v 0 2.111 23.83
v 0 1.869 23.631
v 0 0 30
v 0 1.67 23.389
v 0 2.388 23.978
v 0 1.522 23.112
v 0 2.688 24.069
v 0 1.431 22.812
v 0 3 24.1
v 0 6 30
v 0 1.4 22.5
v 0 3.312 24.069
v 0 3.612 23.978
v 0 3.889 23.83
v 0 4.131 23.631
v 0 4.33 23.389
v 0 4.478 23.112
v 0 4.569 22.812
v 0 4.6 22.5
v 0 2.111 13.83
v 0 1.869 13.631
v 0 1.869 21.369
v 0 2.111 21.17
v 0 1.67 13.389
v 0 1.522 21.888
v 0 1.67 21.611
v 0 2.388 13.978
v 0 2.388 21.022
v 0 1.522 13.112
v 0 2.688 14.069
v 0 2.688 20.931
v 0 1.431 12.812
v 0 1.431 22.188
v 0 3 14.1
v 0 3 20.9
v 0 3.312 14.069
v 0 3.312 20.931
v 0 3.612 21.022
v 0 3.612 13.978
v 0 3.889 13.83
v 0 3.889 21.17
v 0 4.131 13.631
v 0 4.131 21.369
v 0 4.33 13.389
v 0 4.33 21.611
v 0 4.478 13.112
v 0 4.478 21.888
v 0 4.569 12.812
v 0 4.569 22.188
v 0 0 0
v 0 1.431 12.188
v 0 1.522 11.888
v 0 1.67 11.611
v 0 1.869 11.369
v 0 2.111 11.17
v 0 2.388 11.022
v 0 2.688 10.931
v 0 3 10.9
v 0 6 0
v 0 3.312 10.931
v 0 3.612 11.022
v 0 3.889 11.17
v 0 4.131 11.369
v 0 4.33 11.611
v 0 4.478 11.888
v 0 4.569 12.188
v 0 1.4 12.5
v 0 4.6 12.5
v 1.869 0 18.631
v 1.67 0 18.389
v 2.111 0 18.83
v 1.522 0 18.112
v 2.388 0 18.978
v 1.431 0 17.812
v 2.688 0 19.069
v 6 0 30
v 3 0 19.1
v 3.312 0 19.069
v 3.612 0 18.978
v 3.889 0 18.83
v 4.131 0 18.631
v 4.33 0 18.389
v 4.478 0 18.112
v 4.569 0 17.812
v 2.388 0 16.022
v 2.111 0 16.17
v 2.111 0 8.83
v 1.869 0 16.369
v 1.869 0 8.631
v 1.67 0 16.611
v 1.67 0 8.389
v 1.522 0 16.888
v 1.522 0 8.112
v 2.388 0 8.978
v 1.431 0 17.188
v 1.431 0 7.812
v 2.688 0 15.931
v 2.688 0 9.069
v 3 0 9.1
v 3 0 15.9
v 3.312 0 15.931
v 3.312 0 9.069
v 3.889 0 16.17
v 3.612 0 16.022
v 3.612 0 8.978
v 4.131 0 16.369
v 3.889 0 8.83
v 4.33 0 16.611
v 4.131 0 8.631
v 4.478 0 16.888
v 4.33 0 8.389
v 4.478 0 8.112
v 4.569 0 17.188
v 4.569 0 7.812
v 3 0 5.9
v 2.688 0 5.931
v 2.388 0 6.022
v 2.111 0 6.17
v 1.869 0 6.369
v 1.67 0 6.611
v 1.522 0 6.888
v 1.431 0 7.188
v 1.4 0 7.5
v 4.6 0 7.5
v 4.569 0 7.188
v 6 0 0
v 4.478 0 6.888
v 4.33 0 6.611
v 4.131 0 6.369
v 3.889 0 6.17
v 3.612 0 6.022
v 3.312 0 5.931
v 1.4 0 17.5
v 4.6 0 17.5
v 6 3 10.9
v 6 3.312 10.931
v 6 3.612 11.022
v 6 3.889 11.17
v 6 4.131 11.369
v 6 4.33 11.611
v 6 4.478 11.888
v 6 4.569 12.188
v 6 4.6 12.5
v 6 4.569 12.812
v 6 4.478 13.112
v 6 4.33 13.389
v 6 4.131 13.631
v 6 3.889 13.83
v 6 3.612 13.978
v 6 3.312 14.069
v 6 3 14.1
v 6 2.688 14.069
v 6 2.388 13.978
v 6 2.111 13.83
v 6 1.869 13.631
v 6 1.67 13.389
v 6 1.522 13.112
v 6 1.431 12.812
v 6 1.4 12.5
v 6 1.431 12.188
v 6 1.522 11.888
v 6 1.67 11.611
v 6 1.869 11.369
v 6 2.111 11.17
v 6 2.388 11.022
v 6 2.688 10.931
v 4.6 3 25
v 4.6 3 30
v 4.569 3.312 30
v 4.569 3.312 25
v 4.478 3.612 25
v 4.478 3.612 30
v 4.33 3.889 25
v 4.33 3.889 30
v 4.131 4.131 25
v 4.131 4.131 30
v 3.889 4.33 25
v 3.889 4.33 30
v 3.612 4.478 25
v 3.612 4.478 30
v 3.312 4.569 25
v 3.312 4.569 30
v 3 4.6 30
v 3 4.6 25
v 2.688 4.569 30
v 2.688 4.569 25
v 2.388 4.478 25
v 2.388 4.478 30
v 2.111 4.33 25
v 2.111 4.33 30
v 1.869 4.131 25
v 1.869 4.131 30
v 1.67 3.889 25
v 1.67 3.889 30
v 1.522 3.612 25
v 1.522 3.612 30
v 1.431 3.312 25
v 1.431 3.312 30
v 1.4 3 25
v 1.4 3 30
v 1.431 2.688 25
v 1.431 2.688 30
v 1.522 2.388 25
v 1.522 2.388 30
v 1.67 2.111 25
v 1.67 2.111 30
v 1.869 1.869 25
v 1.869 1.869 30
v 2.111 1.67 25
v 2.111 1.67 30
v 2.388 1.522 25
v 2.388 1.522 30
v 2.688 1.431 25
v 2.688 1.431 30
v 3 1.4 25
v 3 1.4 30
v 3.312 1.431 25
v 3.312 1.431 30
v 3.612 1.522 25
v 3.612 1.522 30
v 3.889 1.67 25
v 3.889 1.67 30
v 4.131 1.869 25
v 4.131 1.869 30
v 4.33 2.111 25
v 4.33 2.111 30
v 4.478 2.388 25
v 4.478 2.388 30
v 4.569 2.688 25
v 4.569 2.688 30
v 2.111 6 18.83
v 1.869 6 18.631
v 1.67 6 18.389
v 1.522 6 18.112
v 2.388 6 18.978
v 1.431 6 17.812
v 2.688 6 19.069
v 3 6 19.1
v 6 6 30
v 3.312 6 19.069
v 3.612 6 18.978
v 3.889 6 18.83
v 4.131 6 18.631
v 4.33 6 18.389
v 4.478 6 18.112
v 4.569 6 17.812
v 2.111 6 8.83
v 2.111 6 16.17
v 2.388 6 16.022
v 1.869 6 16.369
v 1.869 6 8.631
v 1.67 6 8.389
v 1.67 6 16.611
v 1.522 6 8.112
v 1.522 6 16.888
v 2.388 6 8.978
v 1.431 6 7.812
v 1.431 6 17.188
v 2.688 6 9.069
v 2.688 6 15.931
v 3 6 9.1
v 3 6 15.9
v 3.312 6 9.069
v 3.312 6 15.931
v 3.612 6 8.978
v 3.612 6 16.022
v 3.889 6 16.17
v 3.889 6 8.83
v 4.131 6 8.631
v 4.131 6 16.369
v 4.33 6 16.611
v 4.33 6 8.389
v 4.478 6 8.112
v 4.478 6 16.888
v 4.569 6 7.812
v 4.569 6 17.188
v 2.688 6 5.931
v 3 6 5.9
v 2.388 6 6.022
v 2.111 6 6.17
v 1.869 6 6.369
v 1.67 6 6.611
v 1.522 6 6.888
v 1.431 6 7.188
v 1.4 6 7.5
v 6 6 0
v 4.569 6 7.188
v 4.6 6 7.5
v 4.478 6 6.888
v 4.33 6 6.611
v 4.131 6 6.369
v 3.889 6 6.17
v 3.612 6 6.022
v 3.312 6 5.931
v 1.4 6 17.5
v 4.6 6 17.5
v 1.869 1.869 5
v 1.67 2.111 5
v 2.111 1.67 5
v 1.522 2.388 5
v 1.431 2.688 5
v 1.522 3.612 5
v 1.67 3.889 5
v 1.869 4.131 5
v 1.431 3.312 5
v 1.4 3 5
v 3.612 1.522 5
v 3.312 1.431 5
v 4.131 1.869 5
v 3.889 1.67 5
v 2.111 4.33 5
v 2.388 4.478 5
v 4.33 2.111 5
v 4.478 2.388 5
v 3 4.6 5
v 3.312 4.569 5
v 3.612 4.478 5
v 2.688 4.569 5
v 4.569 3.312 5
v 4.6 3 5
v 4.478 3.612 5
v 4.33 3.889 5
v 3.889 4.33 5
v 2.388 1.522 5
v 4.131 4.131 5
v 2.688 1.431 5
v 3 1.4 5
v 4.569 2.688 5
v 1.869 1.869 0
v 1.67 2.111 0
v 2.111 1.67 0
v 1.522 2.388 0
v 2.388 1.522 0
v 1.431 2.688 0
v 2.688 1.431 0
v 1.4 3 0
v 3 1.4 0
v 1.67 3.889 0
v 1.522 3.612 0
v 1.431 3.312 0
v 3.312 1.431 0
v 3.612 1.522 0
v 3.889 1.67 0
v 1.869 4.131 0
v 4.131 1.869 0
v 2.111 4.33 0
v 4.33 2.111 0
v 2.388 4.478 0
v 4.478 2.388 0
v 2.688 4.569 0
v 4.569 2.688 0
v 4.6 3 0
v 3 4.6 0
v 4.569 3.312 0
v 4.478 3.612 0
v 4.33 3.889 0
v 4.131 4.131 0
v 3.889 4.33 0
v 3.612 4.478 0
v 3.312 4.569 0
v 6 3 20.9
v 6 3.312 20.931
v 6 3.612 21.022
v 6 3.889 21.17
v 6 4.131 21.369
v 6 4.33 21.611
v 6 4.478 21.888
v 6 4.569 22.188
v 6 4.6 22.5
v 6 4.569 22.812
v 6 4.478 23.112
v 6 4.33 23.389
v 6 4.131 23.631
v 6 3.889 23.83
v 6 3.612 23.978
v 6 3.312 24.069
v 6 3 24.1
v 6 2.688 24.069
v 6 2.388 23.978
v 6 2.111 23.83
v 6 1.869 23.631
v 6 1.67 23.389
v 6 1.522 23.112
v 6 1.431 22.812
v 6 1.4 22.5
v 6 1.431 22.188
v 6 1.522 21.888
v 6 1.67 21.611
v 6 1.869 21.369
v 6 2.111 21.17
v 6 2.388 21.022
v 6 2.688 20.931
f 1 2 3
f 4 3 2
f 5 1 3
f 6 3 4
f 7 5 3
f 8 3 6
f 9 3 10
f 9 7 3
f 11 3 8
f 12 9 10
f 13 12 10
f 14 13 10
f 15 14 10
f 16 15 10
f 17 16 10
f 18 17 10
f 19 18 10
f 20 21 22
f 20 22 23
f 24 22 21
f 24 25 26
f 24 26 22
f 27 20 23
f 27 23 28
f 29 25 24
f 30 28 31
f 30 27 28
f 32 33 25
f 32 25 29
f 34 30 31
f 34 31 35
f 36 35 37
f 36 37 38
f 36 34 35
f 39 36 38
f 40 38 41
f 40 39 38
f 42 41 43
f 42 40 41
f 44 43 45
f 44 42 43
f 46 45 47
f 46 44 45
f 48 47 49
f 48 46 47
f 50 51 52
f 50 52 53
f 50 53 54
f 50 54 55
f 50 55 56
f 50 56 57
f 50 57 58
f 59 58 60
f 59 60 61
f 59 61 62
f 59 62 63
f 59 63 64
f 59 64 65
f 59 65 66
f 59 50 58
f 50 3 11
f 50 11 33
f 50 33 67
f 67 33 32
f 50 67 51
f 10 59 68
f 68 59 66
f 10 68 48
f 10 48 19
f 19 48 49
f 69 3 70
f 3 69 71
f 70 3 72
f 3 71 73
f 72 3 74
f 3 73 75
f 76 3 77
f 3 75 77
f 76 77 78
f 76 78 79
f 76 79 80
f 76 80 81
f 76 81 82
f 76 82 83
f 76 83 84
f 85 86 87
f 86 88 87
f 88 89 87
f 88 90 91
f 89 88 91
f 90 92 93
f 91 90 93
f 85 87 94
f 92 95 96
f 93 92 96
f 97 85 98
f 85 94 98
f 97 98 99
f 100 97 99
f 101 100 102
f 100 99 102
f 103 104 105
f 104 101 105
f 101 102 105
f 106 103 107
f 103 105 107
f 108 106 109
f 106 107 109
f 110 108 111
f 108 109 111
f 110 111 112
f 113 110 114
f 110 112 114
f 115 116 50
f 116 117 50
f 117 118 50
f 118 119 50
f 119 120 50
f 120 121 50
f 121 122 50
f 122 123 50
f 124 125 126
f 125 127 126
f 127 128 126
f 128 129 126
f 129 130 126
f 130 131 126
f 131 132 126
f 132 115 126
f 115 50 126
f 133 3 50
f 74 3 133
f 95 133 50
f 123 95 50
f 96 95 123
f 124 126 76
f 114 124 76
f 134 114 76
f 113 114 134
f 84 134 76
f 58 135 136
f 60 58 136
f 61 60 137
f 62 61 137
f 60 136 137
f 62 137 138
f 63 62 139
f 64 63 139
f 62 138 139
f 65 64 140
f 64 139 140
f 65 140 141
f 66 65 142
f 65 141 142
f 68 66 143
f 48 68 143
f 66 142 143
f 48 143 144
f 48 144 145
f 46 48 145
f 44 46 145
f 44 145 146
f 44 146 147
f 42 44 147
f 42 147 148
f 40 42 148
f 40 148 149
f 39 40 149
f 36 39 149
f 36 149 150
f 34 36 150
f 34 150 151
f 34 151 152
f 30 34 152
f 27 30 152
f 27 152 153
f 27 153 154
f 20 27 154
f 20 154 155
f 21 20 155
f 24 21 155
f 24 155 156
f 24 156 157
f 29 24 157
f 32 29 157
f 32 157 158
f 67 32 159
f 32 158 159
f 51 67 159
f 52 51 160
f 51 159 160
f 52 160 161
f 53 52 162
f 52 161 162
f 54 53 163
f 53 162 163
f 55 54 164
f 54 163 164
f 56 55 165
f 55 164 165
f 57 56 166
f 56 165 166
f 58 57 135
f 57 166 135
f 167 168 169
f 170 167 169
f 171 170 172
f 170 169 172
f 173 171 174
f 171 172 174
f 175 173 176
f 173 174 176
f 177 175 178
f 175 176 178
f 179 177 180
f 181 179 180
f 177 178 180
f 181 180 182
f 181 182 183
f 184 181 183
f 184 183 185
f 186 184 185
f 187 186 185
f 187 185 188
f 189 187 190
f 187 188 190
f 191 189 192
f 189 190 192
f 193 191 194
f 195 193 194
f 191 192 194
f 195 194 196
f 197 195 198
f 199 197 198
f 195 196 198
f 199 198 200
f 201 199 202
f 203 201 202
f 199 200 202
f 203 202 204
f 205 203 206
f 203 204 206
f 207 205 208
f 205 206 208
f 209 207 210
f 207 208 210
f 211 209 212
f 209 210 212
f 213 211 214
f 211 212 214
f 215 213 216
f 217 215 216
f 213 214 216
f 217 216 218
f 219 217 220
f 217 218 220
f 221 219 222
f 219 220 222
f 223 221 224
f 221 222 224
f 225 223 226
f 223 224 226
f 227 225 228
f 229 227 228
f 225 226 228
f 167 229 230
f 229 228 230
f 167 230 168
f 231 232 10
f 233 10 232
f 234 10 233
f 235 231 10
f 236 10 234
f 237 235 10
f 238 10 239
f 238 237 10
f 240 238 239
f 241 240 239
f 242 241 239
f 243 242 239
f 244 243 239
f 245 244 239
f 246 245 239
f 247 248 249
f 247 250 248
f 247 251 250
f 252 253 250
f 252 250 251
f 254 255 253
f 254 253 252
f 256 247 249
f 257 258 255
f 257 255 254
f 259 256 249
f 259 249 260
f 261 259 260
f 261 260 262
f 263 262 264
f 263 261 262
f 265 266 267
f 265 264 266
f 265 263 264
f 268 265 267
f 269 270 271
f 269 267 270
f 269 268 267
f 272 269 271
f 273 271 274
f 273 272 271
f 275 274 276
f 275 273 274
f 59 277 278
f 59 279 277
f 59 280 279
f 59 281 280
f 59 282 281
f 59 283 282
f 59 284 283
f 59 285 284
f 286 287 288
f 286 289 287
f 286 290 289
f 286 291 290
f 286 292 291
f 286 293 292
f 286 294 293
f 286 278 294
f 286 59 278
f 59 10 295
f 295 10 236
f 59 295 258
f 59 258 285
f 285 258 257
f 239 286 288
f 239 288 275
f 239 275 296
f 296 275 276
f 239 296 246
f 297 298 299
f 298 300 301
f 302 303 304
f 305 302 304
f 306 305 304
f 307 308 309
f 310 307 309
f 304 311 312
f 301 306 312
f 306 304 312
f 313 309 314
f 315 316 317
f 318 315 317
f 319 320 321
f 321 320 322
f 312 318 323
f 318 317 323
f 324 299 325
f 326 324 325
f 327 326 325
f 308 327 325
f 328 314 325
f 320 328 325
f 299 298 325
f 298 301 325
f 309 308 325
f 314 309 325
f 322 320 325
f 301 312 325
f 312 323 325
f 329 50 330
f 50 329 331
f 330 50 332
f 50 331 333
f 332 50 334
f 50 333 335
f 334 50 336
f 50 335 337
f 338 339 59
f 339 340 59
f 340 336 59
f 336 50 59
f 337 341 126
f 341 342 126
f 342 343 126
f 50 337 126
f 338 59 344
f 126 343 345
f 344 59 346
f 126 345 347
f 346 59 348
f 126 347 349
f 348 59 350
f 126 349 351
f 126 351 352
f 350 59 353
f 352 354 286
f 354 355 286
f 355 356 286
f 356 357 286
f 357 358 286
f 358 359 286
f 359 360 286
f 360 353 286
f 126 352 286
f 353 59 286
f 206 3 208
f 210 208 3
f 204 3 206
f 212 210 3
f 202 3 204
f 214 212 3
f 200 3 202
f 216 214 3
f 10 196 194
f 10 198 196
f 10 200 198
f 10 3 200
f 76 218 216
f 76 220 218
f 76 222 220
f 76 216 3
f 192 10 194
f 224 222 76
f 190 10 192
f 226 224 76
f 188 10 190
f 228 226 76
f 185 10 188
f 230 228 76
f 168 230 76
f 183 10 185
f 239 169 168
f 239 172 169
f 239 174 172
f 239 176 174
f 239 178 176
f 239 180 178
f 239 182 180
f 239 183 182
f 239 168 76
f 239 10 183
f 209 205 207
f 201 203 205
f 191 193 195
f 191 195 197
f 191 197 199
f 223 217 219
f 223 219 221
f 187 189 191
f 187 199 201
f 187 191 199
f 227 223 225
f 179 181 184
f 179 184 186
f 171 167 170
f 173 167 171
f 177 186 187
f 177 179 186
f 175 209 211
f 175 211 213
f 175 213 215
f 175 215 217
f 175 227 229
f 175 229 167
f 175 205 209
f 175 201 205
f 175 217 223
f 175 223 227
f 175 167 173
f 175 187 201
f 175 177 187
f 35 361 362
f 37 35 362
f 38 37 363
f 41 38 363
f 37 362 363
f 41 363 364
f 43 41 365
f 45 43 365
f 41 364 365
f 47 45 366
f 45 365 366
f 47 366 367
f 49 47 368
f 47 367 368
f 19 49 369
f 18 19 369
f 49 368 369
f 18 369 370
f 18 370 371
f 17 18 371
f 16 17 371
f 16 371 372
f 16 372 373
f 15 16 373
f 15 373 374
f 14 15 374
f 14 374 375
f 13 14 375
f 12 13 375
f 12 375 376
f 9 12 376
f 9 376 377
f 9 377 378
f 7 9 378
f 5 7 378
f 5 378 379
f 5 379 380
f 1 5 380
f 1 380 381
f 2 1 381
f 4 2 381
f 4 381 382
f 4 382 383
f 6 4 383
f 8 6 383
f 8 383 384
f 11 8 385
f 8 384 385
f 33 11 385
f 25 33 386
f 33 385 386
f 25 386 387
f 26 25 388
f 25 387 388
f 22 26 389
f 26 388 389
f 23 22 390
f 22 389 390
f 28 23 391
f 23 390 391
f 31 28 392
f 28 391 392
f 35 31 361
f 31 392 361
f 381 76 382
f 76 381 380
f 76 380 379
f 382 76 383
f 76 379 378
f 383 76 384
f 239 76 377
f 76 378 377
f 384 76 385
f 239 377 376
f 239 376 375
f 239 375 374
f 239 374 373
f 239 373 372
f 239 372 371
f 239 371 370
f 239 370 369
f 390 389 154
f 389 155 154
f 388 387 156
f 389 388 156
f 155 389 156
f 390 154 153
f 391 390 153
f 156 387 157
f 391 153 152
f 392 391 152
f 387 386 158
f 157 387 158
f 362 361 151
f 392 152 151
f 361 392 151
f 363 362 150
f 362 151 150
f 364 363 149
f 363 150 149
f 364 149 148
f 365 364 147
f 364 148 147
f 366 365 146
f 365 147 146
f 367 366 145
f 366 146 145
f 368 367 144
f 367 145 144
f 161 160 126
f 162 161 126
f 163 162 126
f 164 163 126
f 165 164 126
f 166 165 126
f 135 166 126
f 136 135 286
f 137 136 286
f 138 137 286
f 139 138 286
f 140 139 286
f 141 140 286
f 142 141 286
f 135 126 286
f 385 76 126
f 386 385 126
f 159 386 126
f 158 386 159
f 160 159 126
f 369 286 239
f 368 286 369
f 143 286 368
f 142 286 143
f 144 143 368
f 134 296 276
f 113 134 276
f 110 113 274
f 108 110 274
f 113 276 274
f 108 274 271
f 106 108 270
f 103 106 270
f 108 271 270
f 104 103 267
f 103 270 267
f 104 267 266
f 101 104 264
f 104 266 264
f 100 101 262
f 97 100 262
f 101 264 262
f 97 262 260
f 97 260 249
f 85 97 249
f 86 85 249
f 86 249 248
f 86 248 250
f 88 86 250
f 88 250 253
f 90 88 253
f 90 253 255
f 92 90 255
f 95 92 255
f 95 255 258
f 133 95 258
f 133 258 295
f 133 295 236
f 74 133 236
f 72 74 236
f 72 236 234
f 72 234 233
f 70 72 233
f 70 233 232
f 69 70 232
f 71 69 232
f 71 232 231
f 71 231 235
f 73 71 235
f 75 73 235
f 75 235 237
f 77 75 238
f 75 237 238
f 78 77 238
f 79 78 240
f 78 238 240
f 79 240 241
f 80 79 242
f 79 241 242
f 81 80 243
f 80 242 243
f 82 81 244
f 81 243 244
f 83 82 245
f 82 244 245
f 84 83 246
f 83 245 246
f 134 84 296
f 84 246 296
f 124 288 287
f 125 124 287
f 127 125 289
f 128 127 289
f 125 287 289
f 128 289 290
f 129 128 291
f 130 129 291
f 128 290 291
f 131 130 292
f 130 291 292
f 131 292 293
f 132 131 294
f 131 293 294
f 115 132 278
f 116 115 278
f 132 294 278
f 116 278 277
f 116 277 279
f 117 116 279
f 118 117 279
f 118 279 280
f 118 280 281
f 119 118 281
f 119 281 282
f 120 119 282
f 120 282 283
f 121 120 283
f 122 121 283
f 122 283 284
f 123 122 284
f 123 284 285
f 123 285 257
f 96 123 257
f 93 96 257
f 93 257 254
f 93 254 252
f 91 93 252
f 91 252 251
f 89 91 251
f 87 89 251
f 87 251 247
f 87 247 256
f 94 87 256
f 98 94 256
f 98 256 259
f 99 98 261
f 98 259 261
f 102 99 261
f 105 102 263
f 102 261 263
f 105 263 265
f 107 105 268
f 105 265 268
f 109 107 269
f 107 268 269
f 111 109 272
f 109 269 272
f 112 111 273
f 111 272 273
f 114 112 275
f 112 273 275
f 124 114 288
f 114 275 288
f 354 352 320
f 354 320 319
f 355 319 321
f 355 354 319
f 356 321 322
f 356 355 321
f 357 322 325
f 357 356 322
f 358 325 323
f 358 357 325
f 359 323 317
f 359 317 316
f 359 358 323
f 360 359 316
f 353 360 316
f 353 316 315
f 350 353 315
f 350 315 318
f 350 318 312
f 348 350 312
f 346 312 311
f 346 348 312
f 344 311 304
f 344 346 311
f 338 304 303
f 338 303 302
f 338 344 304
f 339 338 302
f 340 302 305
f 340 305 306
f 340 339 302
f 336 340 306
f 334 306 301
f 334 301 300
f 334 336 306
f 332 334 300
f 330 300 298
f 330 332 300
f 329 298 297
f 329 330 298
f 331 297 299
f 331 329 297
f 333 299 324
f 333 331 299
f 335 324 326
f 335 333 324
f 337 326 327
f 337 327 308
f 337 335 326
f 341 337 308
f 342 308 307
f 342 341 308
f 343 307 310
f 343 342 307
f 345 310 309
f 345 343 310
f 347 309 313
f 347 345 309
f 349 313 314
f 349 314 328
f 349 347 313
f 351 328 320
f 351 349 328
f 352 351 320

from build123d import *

# Parameters (mm, degrees)
SKETCH_1_W          = 6
SKETCH_1_H          = 6
EXTRUDE_1_DEPTH     = 30
SKETCH_2_R          = 1.6
CUT_EXTRUDE_1_DEPTH = 5
CUT_EXTRUDE_START   = -30
SKETCH_2_2_R        = 1.6
CUT_EXTRUDE_2_DEPTH = 5
SKETCH_3_R          = 1.6
CUT_EXTRUDE_3_DEPTH = 7
SKETCH_4_R          = 1.6
CUT_EXTRUDE_4_DEPTH = 7


with BuildPart() as part:
    # 草图1 → 凸台-拉伸1 (new body)
    with BuildSketch(Plane.XY):
        with Locations((3, 3)):
            Rectangle(SKETCH_1_W, SKETCH_1_H)
    extrude(amount=EXTRUDE_1_DEPTH)

    # 草图2 → 切除-拉伸1 (cut)
    with BuildSketch(Plane.XY.offset(30)):
        with Locations((3, 3)):
            Circle(SKETCH_2_R)
    extrude(amount=-CUT_EXTRUDE_1_DEPTH, mode=Mode.SUBTRACT)

    # 草图2<2> → 切除-拉伸2 (cut)
    with BuildSketch(Plane.XY.offset(30).offset(CUT_EXTRUDE_START)):
        with Locations((3, 3)):
            Circle(SKETCH_2_2_R)
    extrude(amount=CUT_EXTRUDE_2_DEPTH, mode=Mode.SUBTRACT)

    # 草图3 → 切除-拉伸3 (cut)
    with BuildSketch(Plane(origin=(6, 0, 0), x_dir=(0, 0, -1), z_dir=(1, 0, 0))):
        with Locations((-22.5, 3)):
            Circle(SKETCH_3_R)
        with Locations((-12.5, 3)):
            Circle(SKETCH_3_R)
    extrude(amount=-CUT_EXTRUDE_3_DEPTH, mode=Mode.SUBTRACT)

    # 草图4 → 切除-拉伸4 (cut)
    with BuildSketch(Plane(origin=(0, 6, 0), x_dir=(1, 0, 0), z_dir=(0, 1, 0))):
        with Locations((3, -7.5)):
            Circle(SKETCH_4_R)
        with Locations((3, -17.5)):
            Circle(SKETCH_4_R)
    extrude(amount=-CUT_EXTRUDE_4_DEPTH, mode=Mode.SUBTRACT)


solid = part.part
